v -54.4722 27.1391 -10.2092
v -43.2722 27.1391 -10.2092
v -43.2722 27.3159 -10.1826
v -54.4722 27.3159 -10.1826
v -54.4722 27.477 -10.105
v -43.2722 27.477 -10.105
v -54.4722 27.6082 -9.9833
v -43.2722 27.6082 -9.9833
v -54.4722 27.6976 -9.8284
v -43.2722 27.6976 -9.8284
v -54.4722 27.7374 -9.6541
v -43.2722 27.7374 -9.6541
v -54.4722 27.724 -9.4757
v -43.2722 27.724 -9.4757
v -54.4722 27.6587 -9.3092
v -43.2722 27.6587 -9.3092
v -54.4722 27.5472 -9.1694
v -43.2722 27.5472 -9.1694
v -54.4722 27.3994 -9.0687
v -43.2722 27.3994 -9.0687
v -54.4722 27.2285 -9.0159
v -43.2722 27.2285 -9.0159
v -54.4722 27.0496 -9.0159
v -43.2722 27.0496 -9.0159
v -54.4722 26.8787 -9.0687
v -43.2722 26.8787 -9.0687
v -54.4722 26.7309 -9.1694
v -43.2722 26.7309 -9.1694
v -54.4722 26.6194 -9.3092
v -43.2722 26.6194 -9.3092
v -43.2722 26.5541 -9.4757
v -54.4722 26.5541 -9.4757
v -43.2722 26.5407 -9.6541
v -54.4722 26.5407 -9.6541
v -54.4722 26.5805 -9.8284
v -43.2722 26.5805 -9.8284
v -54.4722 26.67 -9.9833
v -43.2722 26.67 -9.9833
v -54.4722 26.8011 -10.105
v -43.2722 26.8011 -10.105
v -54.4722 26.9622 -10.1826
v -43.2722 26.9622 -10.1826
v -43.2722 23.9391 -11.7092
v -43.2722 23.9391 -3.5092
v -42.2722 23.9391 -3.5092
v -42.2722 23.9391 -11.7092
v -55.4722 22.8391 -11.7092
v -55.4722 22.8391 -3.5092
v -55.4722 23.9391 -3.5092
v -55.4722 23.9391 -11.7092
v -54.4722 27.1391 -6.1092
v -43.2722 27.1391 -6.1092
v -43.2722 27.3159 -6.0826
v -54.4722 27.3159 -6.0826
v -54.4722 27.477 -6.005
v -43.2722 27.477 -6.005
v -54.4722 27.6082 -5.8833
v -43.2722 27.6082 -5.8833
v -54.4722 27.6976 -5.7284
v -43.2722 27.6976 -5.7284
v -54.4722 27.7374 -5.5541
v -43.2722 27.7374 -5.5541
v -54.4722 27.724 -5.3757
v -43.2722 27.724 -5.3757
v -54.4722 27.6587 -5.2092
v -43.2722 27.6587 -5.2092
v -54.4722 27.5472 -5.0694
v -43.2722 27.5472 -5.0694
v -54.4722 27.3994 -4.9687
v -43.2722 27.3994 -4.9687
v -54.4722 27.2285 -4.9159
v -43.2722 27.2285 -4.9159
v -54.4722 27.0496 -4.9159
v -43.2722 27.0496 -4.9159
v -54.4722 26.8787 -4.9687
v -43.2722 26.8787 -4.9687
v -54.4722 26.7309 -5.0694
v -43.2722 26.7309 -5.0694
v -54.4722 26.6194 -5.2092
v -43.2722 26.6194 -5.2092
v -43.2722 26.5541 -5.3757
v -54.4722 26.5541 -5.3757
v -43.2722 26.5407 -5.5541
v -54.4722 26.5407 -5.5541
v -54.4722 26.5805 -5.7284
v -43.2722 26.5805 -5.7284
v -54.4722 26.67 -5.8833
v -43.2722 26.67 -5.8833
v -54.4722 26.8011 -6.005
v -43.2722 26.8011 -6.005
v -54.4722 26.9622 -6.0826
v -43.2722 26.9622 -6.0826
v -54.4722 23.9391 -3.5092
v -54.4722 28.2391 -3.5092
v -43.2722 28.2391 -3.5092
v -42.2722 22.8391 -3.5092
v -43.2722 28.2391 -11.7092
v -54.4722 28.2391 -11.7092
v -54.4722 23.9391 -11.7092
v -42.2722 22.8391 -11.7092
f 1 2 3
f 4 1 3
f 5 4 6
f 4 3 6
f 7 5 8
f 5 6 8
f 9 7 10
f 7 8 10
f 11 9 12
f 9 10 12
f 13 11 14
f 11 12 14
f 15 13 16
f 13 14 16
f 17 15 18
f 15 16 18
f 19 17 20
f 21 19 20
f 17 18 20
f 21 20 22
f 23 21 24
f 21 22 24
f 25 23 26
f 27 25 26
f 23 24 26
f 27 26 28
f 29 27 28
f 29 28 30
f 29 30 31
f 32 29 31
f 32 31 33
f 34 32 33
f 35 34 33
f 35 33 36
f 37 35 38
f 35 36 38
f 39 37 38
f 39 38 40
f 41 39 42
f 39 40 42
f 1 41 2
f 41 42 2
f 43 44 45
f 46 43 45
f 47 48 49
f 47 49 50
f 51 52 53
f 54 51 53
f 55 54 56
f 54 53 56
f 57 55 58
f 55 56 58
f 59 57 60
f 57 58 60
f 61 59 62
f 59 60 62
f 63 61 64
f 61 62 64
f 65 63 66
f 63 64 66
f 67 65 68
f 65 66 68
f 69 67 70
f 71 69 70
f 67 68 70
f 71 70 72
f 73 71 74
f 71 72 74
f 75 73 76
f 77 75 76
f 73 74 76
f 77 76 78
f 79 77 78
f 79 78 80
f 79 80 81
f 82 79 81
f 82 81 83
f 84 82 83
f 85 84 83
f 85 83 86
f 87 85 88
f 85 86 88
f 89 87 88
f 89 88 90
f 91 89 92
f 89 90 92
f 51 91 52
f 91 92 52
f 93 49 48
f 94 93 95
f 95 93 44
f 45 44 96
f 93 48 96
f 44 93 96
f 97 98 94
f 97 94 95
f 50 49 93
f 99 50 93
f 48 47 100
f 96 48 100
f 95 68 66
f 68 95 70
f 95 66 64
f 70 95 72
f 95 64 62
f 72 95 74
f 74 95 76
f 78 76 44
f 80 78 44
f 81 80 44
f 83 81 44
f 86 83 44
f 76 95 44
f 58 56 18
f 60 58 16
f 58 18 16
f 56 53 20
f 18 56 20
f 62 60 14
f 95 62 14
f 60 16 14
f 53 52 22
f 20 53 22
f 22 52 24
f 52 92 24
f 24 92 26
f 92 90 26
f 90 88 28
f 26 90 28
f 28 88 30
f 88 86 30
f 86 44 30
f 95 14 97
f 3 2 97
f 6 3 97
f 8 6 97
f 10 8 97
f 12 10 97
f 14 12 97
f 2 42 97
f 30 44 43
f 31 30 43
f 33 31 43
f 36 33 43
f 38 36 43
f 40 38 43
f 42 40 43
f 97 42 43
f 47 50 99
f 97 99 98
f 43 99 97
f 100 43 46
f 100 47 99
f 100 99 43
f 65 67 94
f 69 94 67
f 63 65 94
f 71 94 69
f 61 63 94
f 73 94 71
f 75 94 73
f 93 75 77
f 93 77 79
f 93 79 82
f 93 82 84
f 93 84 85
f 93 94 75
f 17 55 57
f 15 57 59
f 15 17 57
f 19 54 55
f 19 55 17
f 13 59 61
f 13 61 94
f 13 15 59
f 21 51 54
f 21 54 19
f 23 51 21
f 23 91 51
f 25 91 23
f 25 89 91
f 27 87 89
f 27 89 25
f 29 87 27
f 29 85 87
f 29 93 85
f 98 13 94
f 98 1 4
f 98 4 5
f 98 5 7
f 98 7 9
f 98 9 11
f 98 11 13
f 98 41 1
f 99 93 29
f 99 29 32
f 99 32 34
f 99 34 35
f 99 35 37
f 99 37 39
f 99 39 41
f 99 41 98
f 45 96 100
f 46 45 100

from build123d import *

# Parameters (mm, degrees)
SKETCH1_W           = 132
SKETCH1_H           = 82
BOSS_EXTRUDE1_DEPTH = 11
SKETCH2_W           = 112
SKETCH2_H           = 82
BOSS_EXTRUDE2_DEPTH = 43
SKETCH3_R           = 6
CUT_EXTRUDE1_DEPTH  = 112
SCALE1_SCALE        = 0.1


with BuildPart() as part:
    # Sketch1 → Boss-Extrude1 (new body)
    with BuildSketch(Plane(origin=(0, 0, 0), x_dir=(1, 0, 0), z_dir=(0, 1, 0))):
        with Locations((-48.872246696, 7.585903084)):
            Rectangle(SKETCH1_W, SKETCH1_H)
    extrude(amount=BOSS_EXTRUDE1_DEPTH)

    # Sketch2 → Boss-Extrude2 (add)
    with BuildSketch(Plane(origin=(0, 11, 0), x_dir=(1, 0, 0), z_dir=(0, 1, 0))):
        with Locations((-48.872246696, 7.585903084)):
            Rectangle(SKETCH2_W, SKETCH2_H)
    extrude(amount=BOSS_EXTRUDE2_DEPTH)

    # Sketch3 → Cut-Extrude1 (cut)
    with BuildSketch(Plane(origin=(7.127753304, 0, 0), x_dir=(0, 0, -1), z_dir=(1, 0, 0))):
        with Locations((-13.414096916, 43)):
            Circle(SKETCH3_R)
        with Locations((27.585903084, 43)):
            Circle(SKETCH3_R)
    extrude(amount=-CUT_EXTRUDE1_DEPTH, mode=Mode.SUBTRACT)


with BuildPart() as part_1:
    # Scale1: scaled about (-48.872246696, 25.376724614, -7.611825736)
    add(part.part.scale(SCALE1_SCALE).moved(Location((-43.985022026, 22.839052153, -6.850643162))))


solid = part_1.part
